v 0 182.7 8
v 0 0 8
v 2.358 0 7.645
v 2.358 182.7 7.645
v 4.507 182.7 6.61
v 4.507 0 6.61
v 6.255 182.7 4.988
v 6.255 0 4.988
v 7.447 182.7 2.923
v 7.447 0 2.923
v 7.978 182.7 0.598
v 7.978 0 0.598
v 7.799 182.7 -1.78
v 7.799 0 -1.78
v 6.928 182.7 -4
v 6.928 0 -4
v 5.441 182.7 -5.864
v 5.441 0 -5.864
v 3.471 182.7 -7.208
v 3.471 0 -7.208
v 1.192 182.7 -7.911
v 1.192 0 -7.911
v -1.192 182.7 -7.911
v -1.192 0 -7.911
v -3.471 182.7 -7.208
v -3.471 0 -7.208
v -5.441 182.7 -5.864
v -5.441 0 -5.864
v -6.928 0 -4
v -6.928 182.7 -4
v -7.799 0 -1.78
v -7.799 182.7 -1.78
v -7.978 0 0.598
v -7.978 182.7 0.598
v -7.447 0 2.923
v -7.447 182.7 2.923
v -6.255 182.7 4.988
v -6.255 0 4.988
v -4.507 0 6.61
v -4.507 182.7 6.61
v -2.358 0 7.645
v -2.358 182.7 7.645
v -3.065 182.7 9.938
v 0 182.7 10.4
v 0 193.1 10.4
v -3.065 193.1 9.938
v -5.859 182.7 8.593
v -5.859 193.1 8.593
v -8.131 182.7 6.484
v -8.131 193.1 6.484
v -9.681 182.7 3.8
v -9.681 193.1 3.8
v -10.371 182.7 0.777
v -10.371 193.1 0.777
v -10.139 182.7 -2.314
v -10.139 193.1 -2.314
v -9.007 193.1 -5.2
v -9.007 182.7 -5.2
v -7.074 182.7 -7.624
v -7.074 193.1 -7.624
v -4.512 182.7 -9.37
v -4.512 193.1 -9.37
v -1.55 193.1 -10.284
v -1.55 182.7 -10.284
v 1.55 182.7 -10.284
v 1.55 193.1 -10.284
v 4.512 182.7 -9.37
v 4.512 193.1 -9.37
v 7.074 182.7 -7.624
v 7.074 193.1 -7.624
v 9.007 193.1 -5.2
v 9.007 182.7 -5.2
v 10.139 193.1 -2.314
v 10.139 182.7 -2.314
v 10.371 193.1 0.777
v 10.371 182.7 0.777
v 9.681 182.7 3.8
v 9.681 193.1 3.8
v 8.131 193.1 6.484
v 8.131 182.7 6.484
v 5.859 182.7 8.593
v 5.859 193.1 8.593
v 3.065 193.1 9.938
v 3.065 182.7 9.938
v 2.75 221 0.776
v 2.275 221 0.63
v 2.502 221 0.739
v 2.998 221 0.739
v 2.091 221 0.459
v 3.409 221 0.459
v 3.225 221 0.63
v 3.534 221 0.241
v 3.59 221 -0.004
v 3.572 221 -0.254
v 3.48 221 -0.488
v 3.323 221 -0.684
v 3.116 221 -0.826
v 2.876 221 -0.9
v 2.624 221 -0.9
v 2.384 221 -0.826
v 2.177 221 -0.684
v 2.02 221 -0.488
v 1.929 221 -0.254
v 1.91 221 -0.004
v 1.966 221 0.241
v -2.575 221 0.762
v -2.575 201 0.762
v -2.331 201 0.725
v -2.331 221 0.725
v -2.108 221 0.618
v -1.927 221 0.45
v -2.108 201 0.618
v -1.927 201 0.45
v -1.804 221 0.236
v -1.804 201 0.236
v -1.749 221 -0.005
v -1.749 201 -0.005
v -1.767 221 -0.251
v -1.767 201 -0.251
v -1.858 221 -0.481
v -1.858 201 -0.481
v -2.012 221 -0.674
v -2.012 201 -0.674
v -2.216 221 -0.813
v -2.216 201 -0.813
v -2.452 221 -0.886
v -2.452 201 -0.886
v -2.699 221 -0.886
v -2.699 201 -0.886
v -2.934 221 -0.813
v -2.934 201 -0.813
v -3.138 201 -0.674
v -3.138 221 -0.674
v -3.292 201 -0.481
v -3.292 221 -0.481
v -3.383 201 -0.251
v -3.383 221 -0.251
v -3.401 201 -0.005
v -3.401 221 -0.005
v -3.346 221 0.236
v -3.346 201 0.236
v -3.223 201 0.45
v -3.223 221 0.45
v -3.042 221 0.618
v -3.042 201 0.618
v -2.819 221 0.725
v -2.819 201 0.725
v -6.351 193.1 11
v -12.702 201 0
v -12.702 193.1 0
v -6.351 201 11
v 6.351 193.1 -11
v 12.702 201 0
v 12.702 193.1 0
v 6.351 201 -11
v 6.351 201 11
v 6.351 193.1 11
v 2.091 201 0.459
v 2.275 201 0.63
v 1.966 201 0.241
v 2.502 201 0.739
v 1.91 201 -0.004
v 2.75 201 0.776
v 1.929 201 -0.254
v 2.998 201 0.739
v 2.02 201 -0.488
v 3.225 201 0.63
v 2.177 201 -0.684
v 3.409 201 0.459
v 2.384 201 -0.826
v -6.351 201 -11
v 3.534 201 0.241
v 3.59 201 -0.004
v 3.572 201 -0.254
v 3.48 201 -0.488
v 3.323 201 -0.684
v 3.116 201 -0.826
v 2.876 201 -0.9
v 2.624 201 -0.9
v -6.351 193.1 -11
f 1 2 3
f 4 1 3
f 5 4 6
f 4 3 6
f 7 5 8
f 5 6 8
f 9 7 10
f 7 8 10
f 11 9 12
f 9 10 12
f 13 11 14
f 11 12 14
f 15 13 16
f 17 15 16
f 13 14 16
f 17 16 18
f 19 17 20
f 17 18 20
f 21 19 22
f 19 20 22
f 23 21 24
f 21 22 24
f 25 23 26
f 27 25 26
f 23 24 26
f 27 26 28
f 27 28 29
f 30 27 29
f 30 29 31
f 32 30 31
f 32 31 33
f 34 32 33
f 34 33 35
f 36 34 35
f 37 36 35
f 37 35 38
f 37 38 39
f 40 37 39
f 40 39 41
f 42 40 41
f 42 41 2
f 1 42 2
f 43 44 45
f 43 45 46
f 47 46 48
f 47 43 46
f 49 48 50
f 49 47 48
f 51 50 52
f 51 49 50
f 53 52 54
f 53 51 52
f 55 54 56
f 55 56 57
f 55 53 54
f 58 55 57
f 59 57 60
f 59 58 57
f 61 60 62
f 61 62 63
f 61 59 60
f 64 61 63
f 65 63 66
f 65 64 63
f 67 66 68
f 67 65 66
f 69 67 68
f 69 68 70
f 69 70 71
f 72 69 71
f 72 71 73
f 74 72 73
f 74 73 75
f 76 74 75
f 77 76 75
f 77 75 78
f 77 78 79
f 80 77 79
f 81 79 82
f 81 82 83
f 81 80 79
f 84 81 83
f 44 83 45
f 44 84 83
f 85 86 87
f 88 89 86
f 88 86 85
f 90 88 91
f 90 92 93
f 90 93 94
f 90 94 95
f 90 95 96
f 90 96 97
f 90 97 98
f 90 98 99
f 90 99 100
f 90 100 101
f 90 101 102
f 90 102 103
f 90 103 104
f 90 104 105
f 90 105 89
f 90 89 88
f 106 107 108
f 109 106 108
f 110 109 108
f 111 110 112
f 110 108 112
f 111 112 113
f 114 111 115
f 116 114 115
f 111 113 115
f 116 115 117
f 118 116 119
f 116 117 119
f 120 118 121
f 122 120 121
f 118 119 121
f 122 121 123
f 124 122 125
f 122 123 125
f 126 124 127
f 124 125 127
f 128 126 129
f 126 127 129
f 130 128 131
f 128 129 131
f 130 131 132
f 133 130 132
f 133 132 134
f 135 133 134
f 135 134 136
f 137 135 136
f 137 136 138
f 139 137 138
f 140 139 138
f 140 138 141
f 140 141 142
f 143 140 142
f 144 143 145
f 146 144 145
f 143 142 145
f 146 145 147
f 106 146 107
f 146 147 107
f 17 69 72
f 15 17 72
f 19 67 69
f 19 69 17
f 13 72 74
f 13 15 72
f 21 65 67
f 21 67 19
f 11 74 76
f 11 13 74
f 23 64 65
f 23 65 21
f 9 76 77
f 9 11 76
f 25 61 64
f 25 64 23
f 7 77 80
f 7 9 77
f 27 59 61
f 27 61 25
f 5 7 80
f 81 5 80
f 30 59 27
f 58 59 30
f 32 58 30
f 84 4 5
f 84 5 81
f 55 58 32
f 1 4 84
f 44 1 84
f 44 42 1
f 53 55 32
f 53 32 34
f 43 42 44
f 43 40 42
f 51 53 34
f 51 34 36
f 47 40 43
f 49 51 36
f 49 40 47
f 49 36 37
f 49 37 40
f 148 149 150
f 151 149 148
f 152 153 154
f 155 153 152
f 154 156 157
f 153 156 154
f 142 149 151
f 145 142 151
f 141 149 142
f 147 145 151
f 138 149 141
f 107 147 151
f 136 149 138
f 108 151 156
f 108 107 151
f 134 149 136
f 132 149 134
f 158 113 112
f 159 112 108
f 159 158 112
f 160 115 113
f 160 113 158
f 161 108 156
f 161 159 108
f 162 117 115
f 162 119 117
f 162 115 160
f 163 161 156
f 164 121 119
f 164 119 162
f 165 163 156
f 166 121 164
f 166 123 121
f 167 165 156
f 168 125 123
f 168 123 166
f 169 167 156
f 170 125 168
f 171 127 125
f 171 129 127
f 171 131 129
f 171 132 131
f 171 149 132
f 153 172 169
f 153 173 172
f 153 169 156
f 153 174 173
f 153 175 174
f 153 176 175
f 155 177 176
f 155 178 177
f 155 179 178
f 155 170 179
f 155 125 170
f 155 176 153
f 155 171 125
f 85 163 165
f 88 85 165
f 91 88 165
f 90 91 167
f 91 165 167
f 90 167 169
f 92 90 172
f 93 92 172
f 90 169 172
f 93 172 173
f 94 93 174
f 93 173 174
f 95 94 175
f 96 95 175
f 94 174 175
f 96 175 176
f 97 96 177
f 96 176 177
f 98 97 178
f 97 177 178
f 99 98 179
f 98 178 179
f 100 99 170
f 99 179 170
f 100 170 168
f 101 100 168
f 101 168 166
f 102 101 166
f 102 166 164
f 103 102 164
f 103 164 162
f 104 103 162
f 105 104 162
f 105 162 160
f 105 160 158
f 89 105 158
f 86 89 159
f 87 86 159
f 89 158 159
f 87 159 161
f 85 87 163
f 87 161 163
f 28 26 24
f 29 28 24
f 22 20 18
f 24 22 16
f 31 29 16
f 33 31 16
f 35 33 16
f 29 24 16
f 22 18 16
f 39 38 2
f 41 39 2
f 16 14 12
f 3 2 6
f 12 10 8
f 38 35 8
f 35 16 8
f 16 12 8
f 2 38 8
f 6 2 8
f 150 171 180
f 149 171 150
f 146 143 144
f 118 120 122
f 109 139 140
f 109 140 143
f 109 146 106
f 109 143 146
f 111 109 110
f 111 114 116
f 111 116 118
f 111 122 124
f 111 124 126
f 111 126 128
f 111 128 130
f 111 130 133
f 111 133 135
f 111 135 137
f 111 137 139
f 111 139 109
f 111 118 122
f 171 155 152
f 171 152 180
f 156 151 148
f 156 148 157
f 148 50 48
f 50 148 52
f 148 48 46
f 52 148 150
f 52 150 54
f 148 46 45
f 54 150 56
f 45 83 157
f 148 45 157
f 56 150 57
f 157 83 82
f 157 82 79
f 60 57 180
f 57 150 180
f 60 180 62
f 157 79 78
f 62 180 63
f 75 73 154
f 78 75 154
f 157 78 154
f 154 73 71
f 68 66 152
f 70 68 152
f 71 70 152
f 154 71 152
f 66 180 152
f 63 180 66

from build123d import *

# Parameters (mm, degrees)
SKETCH1_R           = 8
BOSS_EXTRUDE1_DEPTH = 201
SKETCH2_R           = 0.828373934
SKETCH2_R_2         = 0.842670195
BOSS_EXTRUDE2_DEPTH = 20
BOSS_EXTRUDE3_DEPTH = 7.9
BOSS_EXTRUDE4_START = 10.4
SKETCH4_R           = 10.4
SKETCH4_R_2         = 8
BOSS_EXTRUDE4_DEPTH = 10.4


with BuildPart() as part:
    # Sketch1 → Boss-Extrude1 (new body)
    with BuildSketch(Plane(origin=(0, 0, 0), x_dir=(1, 0, 0), z_dir=(0, 1, 0))):
        with Locations(Location((0, 0, 0), (0, 0, 270))):
            Circle(SKETCH1_R)
    extrude(amount=BOSS_EXTRUDE1_DEPTH)

    # Sketch2 → Boss-Extrude2 (add)
    with BuildSketch(Plane(origin=(0, 201, 0), x_dir=(1, 0, 0), z_dir=(0, 1, 0))):
        with Locations(Location((-2.575042815, 0.066667775, 0), (0, 0, 270))):
            Circle(SKETCH2_R)
        with Locations(Location((2.750045724, 0.066667775, 0), (0, 0, 270))):
            Circle(SKETCH2_R_2)
    extrude(amount=BOSS_EXTRUDE2_DEPTH)

    # Sketch3 → Boss-Extrude3 (add)
    with BuildSketch(Plane(origin=(0, 201, 0), x_dir=(1, 0, 0), z_dir=(0, 1, 0))):
        Polygon((12.701705922, 0), (6.350852961, 11), (-6.350852961, 11), (-12.701705922, 0), (-6.350852961, -11), (6.350852961, -11), align=None)
    extrude(amount=-BOSS_EXTRUDE3_DEPTH)

    # Sketch4 → Boss-Extrude4 (add)
    with BuildSketch(Plane.XZ.offset(-193.1).offset(BOSS_EXTRUDE4_START)):
        with Locations(Location((0, 0, 0), (0, 0, 90))):
            Circle(SKETCH4_R)
        with Locations(Location((0, 0, 0), (0, 0, 270))):
            Circle(SKETCH4_R_2, mode=Mode.SUBTRACT)
    extrude(amount=-BOSS_EXTRUDE4_DEPTH)


solid = part.part
